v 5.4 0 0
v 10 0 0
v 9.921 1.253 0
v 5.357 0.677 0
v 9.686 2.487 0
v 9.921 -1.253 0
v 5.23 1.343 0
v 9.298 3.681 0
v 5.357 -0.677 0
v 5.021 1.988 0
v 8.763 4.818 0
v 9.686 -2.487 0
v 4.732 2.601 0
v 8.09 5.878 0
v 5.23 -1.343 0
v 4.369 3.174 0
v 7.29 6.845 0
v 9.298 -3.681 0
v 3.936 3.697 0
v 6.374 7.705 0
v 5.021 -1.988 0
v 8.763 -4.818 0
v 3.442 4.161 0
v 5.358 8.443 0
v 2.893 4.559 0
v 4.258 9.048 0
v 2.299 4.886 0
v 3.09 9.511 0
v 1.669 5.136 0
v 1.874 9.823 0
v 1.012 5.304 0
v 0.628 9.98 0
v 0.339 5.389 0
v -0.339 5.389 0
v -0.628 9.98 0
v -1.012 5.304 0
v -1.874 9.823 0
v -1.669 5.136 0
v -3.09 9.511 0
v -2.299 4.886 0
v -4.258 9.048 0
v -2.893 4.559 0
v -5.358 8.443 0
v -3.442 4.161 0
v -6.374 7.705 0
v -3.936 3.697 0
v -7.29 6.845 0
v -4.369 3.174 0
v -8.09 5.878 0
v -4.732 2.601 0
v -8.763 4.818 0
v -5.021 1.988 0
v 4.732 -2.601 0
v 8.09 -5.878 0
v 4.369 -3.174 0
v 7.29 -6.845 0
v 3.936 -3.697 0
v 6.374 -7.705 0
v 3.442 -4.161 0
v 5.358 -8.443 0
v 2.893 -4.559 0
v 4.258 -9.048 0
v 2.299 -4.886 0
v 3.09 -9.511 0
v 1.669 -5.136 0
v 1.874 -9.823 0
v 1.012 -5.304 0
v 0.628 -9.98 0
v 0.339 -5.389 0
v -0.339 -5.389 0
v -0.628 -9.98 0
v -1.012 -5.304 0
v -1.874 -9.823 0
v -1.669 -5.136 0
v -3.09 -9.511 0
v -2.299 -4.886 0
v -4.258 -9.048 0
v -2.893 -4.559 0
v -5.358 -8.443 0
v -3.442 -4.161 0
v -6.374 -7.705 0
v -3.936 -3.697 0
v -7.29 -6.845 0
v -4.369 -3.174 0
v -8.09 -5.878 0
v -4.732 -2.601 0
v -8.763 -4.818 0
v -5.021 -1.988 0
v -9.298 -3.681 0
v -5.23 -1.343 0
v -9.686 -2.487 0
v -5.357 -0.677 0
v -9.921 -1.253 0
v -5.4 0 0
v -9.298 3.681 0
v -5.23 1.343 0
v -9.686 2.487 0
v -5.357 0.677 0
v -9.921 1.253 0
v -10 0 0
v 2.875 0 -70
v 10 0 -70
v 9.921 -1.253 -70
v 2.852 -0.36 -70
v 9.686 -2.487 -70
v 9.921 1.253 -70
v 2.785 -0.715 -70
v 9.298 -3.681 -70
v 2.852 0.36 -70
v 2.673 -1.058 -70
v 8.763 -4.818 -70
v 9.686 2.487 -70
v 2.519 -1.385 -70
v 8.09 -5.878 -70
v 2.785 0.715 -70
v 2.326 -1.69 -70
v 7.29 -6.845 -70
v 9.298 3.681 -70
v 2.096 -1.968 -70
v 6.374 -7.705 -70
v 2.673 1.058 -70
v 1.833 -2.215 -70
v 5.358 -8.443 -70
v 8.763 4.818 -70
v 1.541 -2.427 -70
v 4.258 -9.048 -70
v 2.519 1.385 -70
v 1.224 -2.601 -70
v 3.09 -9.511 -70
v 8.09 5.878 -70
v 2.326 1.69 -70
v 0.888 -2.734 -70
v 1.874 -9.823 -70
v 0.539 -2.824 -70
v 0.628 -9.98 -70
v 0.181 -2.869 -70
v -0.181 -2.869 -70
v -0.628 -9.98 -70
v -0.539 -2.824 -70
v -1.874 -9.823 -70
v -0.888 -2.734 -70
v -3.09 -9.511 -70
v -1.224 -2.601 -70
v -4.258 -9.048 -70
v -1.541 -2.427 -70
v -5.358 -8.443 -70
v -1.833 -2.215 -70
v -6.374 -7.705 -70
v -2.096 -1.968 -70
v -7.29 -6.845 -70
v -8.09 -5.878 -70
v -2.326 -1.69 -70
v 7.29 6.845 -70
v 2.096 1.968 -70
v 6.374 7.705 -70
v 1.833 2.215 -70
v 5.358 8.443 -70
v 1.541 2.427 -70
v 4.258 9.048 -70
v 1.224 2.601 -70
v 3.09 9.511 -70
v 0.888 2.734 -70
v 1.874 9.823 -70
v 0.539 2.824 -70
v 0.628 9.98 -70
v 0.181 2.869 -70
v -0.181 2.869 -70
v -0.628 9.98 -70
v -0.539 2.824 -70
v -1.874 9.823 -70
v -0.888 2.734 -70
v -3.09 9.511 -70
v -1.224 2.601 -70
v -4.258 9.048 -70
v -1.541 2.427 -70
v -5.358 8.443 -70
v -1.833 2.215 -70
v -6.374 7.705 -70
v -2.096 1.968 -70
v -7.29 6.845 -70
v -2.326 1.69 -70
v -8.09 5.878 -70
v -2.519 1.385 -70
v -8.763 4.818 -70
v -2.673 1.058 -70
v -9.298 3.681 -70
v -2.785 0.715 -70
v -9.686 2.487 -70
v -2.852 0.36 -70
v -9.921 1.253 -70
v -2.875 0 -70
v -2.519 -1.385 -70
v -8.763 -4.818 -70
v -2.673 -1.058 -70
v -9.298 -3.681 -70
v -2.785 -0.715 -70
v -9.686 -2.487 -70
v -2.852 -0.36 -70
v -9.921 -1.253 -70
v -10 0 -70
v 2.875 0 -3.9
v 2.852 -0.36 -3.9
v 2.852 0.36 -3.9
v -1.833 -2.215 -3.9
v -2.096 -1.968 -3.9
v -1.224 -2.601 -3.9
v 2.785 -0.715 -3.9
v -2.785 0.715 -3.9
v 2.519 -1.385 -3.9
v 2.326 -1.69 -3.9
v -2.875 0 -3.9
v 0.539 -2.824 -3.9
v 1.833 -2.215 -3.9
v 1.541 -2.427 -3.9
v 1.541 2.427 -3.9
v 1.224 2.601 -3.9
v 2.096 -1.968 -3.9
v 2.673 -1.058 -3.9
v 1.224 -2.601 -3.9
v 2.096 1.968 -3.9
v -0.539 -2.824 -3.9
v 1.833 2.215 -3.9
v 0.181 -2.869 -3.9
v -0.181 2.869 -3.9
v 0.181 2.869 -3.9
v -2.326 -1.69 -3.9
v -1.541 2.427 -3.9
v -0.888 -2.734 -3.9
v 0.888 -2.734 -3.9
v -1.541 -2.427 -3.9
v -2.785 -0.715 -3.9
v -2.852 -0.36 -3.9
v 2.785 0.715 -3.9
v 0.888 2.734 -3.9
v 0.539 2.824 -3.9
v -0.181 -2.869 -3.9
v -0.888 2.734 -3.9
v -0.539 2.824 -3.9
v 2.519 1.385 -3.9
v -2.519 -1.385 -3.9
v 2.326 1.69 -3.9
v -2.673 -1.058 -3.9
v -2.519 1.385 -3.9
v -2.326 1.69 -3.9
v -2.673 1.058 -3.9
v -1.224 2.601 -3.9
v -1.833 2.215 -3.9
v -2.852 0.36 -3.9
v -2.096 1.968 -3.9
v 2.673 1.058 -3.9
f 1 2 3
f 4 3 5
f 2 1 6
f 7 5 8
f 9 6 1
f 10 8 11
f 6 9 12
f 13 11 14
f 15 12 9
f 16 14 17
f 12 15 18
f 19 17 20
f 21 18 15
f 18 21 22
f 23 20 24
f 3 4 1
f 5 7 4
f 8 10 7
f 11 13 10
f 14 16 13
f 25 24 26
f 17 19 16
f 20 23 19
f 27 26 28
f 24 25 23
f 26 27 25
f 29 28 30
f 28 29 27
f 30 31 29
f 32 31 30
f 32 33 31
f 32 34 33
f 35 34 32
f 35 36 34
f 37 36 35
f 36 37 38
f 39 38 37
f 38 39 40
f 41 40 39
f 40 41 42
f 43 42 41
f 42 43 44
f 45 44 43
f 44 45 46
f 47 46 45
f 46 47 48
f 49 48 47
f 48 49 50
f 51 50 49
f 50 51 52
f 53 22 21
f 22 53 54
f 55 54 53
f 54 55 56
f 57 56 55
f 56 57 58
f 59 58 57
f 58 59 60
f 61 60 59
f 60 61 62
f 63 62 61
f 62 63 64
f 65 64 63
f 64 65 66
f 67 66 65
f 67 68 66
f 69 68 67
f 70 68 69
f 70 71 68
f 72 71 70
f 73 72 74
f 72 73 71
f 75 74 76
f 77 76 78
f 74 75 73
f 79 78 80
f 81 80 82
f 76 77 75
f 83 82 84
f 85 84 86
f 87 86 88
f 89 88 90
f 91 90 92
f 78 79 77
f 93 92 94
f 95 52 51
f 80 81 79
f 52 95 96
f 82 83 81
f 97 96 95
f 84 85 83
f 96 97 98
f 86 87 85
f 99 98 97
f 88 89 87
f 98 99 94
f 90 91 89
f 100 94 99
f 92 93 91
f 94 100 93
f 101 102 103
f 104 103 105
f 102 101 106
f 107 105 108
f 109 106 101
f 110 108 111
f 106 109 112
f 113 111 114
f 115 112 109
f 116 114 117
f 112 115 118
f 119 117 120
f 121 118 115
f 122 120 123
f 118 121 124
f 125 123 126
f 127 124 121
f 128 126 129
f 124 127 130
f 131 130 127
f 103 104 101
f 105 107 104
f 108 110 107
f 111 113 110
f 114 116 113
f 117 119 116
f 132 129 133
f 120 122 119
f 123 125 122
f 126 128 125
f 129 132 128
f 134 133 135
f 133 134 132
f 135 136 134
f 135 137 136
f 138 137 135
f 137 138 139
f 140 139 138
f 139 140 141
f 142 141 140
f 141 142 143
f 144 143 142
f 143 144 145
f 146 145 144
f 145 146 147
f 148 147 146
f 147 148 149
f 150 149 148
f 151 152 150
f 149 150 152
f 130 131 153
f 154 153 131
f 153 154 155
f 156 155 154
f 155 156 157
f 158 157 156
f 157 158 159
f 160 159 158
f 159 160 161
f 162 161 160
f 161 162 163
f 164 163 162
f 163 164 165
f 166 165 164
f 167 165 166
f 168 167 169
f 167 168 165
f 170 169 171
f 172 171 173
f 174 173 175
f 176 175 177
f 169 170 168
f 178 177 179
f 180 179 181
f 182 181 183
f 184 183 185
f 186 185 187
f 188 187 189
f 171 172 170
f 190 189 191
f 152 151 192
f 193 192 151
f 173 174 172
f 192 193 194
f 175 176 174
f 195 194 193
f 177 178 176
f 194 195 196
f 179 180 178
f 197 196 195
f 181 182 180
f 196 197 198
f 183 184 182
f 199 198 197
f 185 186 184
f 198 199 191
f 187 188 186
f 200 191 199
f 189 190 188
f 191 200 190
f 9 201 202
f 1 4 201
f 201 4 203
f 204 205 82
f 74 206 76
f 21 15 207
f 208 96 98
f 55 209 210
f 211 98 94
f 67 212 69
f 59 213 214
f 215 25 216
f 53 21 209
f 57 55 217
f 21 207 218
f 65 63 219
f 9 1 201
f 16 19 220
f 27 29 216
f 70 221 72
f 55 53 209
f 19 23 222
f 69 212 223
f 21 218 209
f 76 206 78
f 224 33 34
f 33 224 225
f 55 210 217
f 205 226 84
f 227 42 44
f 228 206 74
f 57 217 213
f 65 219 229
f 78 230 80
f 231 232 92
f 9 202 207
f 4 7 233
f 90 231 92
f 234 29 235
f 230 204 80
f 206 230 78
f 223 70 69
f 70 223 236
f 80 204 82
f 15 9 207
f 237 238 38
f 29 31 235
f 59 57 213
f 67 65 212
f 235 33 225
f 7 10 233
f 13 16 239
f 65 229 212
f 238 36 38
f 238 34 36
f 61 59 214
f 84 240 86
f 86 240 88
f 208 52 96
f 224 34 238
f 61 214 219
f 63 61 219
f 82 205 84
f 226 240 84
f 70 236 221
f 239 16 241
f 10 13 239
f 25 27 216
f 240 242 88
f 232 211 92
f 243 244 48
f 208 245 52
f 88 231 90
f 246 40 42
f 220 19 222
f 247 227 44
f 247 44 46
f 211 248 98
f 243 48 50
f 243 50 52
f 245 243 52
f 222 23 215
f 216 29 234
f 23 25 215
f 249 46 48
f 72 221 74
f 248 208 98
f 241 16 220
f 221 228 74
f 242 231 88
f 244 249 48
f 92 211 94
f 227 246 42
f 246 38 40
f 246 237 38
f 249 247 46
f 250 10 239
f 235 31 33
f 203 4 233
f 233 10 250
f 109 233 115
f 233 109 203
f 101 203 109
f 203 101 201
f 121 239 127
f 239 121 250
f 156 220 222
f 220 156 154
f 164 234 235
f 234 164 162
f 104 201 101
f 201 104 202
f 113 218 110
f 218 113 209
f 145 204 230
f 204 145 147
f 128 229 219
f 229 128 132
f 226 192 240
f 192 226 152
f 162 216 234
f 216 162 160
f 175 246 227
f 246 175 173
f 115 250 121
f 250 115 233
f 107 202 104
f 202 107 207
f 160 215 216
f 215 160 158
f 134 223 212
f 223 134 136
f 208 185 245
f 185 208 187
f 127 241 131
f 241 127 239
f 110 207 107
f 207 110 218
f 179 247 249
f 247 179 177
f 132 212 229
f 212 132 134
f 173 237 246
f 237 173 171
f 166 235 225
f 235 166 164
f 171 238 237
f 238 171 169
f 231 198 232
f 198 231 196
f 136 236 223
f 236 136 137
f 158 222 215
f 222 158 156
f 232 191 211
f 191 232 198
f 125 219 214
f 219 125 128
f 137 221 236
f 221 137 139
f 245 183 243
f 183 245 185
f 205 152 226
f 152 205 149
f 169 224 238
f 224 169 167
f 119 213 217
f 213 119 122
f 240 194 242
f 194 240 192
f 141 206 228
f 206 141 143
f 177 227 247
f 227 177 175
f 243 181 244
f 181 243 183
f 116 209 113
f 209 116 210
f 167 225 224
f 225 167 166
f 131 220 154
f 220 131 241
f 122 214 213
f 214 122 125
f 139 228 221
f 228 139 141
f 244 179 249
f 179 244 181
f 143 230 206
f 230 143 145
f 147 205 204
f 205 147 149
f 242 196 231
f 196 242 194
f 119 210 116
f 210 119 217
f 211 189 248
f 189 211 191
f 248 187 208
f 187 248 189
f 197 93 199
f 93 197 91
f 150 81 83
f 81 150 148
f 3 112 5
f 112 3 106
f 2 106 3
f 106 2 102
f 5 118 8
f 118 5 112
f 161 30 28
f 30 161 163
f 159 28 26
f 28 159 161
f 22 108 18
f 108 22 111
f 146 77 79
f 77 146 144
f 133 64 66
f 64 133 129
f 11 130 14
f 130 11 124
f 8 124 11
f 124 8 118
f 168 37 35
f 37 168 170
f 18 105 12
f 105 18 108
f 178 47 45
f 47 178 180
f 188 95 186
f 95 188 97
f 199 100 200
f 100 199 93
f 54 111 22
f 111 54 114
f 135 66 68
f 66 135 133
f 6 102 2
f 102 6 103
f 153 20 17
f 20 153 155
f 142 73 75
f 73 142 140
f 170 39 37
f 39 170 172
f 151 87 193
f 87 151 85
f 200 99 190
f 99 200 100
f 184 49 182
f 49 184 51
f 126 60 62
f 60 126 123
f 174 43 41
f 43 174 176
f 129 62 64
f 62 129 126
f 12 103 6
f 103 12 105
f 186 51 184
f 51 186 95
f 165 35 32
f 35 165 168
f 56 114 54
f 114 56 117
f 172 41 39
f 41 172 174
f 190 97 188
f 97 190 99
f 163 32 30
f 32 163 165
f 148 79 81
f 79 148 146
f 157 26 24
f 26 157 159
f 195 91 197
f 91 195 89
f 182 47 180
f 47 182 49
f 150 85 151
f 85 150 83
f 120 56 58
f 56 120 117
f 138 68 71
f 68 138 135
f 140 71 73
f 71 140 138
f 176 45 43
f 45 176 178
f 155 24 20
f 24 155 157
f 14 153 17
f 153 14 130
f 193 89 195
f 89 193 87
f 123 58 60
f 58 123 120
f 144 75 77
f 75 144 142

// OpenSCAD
$fn = 50;


difference() {
	union() {
		translate(v = [0, 0, -70.0000000000]) {
			cylinder(h = 70, r = 10.0000000000);
		}
		cylinder(h = 0, r = 13.0000000000);
	}
	union() {
		translate(v = [0, 0, 0]) {
			rotate(a = [0, 0, 0]) {
				difference() {
					union() {
						#translate(v = [0, 0, -70.0000000000]) {
							cylinder(h = 70, r = 2.6000000000);
						}
						#translate(v = [0, 0, -3.9000000000]) {
							cylinder(h = 3.9000000000, r = 10.0000000000, r1 = 2.8750000000, r2 = 5.4000000000);
						}
						#translate(v = [0, 0, -70.0000000000]) {
							cylinder(h = 70, r = 2.8750000000);
						}
						#translate(v = [0, 0, -70.0000000000]) {
							cylinder(h = 70, r = 2.6000000000);
						}
					}
					union();
				}
			}
		}
	}
}
